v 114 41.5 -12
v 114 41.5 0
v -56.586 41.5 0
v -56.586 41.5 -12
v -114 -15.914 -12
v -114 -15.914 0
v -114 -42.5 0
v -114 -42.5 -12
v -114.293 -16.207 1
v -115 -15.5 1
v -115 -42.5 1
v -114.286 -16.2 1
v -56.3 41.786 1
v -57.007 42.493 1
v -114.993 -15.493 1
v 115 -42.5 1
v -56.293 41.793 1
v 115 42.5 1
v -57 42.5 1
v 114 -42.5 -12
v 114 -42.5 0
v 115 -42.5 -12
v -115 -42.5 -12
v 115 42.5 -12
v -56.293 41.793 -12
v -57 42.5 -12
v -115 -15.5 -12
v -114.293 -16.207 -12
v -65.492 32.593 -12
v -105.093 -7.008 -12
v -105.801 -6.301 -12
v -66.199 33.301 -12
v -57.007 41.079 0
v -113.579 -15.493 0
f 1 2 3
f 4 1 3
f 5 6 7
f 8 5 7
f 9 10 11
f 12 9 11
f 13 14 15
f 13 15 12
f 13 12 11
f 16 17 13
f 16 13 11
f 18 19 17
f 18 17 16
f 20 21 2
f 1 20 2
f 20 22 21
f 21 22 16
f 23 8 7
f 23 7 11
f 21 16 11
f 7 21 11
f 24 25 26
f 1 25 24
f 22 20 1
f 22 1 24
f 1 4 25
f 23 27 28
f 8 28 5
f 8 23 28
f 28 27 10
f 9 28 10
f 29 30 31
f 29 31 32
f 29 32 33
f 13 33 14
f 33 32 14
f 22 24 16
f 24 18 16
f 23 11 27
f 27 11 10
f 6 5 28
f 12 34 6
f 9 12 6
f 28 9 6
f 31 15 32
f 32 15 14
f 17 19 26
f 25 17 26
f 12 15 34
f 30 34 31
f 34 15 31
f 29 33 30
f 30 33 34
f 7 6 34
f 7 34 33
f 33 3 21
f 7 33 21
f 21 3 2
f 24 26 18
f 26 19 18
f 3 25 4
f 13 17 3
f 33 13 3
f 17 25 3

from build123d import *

# Parameters (mm, degrees)
F1_DEPTH = 1
F3_DEPTH = 12
F5_DEPTH = 1


with BuildPart() as f1:
    # F0 (on Top) → F1 (new body)
    with BuildSketch(Plane.XY):
        Polygon((-115, -42.5), (115, -42.5), (115, 42.5), (-57, 42.5), (-115, -15.5), align=None)
    extrude(amount=F1_DEPTH)

    # F2 (on face) → F3 (join)
    with BuildSketch(Plane(origin=(0, 0, 0), x_dir=(1, 0, 0), z_dir=(0, 0, -1))):
        Polygon((-115, 42.5), (-115, 15.5), (-57, -42.5), (115, -42.5), (115, 42.5), (114, 42.5), (114, -41.5), (-56.5857864376, -41.5), (-114, 15.9142135624), (-114, 42.5), align=None)
    extrude(amount=F3_DEPTH)

    # F4 (on face) → F5 (cut)
    with BuildSketch(Plane(origin=(-49.75, 49.75, 0), x_dir=(-0.7071067812, -0.7071067812, 0), z_dir=(-0.7071067812, 0.7071067812, 0))):
        Polygon((10.2630483272, 1), (10.2530483272, 1), (10.2530483272, -12), (23.2630483272, -12), align=None)
        Polygon((92.2774349448, -12), (92.2774349448, 1), (92.2674349448, 1), (79.2674349448, -12), align=None)
    extrude(amount=-F5_DEPTH, mode=Mode.SUBTRACT)


solid = f1.part
